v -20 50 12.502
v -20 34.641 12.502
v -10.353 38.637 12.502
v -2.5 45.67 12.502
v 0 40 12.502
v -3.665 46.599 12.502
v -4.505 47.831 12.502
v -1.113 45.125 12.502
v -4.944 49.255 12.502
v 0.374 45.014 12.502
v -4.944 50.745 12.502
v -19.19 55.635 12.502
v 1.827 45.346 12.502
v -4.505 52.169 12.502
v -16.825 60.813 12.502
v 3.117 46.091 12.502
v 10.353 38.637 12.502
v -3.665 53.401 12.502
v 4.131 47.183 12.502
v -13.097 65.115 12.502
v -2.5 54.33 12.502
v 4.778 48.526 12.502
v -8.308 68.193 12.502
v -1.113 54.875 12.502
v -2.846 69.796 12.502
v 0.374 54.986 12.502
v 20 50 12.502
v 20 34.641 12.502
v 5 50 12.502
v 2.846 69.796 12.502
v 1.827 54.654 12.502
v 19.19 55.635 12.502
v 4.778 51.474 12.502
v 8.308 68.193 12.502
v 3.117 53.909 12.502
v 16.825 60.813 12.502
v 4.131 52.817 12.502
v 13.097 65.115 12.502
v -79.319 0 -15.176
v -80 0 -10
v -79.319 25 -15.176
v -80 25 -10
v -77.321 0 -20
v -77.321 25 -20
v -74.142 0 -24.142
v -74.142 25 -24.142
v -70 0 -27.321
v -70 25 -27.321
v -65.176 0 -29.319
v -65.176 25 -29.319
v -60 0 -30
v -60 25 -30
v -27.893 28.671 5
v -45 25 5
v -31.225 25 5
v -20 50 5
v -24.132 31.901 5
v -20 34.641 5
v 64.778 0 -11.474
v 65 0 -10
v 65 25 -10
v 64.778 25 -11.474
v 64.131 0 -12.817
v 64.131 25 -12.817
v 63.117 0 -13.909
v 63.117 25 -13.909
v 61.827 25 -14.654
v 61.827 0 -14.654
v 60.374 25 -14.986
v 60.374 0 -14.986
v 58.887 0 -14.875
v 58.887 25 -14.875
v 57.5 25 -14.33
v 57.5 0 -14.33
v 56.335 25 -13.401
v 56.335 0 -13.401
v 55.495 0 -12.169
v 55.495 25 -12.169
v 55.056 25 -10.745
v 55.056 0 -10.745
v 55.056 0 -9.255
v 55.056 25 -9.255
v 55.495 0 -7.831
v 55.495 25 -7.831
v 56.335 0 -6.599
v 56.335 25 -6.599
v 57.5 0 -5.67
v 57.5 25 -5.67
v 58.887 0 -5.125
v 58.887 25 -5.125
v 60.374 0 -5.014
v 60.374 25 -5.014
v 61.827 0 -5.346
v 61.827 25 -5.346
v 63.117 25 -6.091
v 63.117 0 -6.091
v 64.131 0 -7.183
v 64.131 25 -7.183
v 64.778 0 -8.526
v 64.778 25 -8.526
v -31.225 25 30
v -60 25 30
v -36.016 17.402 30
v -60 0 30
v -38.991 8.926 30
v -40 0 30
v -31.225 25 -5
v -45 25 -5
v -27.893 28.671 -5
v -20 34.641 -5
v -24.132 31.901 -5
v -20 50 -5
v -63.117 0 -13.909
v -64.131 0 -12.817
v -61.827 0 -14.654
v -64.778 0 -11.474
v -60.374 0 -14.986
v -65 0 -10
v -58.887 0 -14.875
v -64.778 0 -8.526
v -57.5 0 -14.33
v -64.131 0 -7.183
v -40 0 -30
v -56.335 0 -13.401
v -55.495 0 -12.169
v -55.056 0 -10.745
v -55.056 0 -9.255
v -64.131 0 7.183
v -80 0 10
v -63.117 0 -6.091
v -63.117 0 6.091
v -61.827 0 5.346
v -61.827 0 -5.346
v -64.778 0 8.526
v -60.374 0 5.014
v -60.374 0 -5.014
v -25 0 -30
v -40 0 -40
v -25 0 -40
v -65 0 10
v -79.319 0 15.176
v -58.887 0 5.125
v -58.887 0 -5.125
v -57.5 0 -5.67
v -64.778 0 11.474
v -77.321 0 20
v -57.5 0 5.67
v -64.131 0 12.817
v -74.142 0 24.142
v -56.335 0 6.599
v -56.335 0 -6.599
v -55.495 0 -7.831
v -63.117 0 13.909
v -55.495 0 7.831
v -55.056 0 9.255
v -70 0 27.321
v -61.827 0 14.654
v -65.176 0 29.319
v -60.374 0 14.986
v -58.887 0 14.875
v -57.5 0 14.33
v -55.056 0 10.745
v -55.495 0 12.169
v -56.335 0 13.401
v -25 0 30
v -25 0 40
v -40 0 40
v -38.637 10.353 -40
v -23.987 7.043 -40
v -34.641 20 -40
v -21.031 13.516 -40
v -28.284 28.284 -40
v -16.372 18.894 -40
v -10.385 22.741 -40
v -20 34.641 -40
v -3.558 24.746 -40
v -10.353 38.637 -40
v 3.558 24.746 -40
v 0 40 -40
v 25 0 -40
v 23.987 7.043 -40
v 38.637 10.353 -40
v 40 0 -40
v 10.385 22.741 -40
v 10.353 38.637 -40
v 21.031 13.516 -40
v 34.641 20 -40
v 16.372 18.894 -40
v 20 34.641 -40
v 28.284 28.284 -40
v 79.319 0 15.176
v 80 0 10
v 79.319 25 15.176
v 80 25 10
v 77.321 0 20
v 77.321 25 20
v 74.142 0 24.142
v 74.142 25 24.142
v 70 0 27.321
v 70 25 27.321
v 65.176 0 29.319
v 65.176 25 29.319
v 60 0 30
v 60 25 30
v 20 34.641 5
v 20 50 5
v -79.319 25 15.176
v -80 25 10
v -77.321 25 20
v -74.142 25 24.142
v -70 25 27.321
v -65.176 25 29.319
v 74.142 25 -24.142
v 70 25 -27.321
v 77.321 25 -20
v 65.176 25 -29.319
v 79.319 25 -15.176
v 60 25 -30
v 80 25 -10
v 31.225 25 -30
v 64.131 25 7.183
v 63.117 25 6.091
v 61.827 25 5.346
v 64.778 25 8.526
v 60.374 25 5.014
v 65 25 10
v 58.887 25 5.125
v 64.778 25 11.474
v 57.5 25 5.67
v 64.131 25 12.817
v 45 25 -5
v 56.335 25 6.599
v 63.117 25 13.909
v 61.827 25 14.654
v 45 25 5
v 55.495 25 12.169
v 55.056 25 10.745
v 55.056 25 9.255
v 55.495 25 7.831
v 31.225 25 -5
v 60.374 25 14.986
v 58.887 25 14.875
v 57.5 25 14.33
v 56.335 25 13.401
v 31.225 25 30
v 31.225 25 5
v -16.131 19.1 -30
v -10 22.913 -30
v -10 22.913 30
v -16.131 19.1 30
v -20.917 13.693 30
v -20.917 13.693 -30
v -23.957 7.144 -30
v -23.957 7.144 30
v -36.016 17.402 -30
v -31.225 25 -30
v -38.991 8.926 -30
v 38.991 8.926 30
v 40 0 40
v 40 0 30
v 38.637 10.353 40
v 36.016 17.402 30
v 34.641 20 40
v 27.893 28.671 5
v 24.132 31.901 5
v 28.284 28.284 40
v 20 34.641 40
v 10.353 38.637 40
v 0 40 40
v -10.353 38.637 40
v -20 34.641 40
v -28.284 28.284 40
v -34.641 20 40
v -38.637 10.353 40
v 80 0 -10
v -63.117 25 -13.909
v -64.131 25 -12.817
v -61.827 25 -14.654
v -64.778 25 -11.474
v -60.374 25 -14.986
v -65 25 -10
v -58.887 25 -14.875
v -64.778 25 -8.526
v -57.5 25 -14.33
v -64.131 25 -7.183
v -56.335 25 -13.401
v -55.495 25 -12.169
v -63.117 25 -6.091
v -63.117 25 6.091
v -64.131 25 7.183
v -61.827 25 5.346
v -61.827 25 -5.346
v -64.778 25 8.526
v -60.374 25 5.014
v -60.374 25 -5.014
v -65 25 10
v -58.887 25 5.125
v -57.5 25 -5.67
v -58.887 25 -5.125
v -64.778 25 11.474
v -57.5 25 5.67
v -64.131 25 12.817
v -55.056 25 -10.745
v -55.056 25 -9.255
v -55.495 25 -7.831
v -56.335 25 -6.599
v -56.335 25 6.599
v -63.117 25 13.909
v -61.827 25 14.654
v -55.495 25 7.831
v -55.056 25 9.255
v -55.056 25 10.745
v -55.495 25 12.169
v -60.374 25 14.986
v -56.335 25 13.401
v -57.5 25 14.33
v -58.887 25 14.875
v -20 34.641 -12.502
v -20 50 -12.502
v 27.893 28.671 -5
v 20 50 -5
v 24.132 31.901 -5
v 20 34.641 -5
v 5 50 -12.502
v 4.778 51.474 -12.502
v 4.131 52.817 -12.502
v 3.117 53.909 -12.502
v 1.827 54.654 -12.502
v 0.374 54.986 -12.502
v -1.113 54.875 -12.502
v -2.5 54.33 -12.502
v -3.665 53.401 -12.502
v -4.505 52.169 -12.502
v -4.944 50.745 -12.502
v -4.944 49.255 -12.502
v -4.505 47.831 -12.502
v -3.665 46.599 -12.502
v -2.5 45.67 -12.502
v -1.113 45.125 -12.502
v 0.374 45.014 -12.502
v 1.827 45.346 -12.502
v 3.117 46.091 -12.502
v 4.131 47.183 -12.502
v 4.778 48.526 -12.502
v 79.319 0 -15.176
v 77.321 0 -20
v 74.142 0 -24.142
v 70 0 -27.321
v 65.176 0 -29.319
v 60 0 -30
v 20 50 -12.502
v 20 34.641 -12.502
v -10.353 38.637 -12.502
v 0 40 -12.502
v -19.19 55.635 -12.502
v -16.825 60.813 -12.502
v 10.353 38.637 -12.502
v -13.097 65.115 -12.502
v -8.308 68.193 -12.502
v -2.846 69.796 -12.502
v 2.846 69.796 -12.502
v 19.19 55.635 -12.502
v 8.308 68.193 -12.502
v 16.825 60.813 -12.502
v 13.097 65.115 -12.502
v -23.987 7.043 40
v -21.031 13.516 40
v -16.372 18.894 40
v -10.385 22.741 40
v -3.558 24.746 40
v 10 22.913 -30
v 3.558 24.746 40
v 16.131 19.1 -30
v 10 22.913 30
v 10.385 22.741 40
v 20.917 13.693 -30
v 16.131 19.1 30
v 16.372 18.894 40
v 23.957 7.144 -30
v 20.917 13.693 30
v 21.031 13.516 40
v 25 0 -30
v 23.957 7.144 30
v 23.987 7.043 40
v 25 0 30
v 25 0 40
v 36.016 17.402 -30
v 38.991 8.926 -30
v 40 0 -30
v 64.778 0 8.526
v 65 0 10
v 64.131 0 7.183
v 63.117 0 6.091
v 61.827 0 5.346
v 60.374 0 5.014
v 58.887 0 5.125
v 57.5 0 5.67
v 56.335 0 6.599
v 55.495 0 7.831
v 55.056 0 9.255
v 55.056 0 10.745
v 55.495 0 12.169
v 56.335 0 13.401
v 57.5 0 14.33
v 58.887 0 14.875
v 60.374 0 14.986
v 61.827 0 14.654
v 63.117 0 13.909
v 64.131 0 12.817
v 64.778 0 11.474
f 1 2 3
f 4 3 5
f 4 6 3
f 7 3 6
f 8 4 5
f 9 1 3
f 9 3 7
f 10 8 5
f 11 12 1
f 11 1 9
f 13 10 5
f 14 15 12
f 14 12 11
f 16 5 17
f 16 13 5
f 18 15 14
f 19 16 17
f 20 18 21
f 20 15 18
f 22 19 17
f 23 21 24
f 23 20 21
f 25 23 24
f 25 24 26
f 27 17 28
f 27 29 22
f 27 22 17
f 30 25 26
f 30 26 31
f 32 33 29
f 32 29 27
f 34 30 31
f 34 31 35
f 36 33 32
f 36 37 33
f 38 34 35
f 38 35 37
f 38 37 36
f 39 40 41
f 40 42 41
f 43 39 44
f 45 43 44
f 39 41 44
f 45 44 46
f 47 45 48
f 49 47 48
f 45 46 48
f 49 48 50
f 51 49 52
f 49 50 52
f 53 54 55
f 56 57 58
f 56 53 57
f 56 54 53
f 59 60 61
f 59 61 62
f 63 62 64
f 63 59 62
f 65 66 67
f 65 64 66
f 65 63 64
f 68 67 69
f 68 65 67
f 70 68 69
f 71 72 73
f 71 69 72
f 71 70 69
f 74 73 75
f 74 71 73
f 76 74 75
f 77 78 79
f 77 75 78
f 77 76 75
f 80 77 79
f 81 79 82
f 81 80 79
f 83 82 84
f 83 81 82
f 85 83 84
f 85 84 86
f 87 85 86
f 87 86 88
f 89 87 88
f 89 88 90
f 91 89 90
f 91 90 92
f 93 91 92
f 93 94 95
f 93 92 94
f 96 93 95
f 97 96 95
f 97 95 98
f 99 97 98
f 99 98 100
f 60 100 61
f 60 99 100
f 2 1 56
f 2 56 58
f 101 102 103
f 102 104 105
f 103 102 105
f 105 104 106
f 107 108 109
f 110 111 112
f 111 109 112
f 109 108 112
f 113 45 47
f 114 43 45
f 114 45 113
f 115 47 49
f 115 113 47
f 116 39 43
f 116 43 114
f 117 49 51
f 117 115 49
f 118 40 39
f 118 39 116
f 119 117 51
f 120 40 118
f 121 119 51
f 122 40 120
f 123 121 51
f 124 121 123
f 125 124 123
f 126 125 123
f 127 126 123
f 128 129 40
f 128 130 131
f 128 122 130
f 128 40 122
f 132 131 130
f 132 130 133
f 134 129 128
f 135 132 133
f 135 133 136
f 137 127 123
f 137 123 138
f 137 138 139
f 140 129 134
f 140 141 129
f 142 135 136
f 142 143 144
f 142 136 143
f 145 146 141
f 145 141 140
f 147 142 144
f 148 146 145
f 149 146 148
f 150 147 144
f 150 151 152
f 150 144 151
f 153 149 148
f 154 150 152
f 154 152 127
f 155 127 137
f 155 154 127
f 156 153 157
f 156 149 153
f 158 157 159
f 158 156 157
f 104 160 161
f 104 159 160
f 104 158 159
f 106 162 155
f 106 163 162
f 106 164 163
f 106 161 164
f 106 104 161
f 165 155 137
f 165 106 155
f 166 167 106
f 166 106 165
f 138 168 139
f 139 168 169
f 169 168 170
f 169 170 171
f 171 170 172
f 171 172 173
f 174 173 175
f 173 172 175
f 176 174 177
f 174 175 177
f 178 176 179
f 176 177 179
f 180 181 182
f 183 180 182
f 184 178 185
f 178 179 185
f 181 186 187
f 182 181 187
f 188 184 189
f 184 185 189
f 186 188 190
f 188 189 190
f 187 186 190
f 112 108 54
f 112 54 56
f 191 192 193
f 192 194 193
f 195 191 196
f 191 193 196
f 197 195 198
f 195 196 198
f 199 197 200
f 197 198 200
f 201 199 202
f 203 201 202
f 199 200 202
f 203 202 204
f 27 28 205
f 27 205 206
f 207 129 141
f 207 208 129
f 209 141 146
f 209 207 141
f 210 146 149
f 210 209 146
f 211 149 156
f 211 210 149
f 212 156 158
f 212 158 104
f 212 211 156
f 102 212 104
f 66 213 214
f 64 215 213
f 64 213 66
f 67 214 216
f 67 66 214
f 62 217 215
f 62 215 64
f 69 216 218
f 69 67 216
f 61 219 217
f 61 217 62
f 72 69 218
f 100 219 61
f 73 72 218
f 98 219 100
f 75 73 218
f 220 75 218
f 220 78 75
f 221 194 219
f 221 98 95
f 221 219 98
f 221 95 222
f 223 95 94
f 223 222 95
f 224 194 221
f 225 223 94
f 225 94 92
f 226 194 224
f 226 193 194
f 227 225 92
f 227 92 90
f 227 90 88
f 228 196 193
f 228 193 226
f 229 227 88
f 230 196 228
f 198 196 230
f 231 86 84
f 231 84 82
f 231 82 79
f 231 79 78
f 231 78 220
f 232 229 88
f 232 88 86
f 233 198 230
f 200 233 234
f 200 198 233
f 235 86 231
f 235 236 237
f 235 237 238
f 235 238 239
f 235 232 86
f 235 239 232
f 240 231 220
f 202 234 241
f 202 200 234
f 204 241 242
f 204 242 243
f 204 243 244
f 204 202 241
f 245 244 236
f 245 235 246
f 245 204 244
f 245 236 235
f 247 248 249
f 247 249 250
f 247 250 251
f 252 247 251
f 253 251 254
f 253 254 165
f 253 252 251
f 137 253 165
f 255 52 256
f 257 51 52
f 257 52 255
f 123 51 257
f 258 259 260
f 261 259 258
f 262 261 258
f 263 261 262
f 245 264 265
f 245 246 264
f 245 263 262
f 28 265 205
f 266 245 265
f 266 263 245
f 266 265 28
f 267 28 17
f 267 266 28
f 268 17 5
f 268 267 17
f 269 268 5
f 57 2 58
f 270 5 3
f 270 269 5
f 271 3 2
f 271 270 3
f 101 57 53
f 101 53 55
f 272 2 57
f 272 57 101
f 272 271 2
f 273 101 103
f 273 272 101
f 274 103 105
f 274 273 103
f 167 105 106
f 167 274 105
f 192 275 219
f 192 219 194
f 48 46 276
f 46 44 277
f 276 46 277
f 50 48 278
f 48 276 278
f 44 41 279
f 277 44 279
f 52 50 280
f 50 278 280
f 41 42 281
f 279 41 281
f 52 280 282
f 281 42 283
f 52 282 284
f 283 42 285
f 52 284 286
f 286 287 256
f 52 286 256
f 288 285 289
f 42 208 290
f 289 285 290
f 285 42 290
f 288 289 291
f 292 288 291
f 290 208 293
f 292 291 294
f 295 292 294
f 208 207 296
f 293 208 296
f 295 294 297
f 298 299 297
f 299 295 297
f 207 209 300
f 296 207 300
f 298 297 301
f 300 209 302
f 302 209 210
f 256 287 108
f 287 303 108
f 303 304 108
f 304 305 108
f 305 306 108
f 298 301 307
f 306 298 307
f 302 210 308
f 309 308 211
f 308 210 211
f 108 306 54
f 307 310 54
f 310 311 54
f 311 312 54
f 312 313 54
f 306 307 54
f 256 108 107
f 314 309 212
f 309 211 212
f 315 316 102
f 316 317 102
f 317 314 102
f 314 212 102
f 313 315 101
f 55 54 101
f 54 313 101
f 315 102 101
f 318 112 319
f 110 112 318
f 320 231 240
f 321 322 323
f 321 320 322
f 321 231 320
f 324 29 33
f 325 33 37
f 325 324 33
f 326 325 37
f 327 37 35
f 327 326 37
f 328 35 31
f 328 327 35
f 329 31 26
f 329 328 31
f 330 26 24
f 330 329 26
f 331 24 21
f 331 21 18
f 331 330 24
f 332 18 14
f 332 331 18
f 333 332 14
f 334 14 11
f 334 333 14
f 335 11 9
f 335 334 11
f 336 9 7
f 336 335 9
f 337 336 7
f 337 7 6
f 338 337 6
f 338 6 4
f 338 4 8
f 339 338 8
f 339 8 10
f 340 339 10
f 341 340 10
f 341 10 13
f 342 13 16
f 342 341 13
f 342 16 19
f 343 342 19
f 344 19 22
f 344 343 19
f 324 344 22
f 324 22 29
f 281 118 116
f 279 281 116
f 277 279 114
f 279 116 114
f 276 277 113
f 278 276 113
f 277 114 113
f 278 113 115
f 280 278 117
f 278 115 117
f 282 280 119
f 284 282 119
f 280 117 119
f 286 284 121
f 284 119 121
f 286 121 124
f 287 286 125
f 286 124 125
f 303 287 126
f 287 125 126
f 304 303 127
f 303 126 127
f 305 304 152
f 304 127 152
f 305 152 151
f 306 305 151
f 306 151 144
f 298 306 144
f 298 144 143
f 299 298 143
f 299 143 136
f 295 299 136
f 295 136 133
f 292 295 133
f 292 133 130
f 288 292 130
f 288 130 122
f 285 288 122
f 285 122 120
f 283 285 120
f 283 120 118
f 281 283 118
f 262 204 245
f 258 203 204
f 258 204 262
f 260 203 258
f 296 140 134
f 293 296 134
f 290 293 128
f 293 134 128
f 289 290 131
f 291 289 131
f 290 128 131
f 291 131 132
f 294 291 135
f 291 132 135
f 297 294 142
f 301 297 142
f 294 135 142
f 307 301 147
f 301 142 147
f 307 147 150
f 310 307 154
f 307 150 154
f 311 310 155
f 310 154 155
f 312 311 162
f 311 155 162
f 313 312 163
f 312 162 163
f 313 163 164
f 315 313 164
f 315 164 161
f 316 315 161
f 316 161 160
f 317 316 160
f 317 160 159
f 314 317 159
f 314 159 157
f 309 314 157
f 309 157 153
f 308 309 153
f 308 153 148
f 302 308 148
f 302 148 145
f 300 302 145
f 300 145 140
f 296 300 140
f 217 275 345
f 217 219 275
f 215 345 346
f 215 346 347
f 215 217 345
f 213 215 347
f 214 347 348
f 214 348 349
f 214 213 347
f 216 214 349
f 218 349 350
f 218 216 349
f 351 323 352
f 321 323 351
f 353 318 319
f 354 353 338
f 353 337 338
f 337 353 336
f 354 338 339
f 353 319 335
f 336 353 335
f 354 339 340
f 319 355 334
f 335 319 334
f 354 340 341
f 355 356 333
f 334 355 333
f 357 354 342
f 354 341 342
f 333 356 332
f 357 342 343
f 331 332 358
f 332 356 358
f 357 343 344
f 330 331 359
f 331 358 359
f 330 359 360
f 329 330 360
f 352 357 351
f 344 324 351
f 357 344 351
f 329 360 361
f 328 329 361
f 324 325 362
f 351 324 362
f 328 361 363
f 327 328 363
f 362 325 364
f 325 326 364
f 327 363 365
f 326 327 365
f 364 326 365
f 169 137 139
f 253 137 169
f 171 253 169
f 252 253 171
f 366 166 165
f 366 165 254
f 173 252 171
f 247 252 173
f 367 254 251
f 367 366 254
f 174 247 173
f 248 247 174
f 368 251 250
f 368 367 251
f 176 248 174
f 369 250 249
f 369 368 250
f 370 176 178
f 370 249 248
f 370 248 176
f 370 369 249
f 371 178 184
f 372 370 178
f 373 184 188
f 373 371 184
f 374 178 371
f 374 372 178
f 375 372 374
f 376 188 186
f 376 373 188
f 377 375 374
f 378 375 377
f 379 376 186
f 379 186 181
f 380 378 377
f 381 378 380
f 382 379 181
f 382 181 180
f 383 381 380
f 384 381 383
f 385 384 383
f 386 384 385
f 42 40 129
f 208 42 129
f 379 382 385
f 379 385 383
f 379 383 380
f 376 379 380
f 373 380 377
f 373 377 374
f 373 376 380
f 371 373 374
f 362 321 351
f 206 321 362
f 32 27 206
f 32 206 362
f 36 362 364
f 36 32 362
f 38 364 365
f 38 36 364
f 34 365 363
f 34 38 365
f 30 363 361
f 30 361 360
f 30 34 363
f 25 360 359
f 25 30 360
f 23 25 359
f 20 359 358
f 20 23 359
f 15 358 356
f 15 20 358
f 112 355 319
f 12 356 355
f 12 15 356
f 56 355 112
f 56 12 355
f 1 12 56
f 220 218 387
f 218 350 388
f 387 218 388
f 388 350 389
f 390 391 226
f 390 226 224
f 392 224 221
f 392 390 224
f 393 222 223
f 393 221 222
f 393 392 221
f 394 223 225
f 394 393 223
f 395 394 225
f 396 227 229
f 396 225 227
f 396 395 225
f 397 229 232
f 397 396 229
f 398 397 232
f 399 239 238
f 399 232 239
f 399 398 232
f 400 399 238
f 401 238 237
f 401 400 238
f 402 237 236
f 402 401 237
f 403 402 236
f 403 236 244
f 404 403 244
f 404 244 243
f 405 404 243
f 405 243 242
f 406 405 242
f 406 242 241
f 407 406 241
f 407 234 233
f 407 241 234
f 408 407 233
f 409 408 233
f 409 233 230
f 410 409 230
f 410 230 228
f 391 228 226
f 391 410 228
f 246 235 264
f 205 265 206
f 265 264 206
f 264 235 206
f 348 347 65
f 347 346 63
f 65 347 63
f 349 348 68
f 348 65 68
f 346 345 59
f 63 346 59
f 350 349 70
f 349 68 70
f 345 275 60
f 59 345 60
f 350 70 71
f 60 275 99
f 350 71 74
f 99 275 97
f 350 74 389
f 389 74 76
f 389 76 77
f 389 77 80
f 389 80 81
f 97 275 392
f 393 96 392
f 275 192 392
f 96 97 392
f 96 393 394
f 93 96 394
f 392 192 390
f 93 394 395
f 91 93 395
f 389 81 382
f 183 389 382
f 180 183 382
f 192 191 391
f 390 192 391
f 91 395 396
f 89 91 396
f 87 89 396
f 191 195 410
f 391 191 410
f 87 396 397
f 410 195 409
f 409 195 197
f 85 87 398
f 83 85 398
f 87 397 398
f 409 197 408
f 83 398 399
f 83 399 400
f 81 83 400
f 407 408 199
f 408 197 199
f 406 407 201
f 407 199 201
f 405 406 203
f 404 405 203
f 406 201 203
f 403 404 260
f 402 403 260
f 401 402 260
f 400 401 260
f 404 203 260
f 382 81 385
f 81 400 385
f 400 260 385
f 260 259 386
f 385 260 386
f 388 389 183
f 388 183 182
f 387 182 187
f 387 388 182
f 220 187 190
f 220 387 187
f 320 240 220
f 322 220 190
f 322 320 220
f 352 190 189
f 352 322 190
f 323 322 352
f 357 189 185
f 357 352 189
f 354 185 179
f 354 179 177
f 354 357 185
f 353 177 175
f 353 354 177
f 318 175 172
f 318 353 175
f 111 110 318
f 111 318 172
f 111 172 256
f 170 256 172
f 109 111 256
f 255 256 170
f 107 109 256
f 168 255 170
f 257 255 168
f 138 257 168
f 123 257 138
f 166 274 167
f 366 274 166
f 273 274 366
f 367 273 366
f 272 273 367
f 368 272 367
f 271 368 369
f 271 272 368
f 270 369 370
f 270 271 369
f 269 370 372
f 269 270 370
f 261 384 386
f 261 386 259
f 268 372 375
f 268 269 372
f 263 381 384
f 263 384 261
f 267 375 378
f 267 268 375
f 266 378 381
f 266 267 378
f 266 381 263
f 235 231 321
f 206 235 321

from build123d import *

# Parameters (mm, degrees)
BOSS_EXTRUDE1_DEPTH        = 40
SKETCH2_W                  = 70
SKETCH2_H                  = 60
BOSS_EXTRUDE2_DEPTH        = 25
FILLET1_R                  = 20
F_10_0_10_DIAMETER_HOLE1_D = 10
FILLET1_OF_MIRROR1_R       = 20
DELETEFACE1_START          = -30
DELETEFACE1_DEPTH          = 60
SKETCH5_R                  = 5
BOSS_EXTRUDE3_DEPTH        = 12.5015
RIB1_REACH                 = 115.578
SKETCH6_WALL_W             = 264.511672892
SKETCH6_WALL_H             = 10


# Read off the part's stored shape, not the designer's step: DeleteFace1
with BuildPart() as part:
    # Sketch1 → Boss-Extrude1 (new, symmetric)
    with BuildSketch(Plane.XY):
        with BuildLine():
            Line((-40, 0), (-25, 0))
            ThreePointArc((-25, 0), (0, 25), (25, 0))
            Line((25, 0), (40, 0))
            ThreePointArc((40, 0), (0, 40), (-40, 0))
        make_face()
    extrude(amount=BOSS_EXTRUDE1_DEPTH, both=True)

    # Sketch2 → Boss-Extrude2 (add)
    with BuildSketch(Plane.XZ):
        with Locations((-45, 0)):
            Rectangle(SKETCH2_W, SKETCH2_H)
    boss_extrude2 = extrude(amount=-BOSS_EXTRUDE2_DEPTH)

    # Fillet1
    fillet1_edges = [part.edges().sort_by_distance(p)[0] for p in [
        (-80, 12.5, 30),
        (-80, 12.5, -30),
    ]]
    fillet(fillet1_edges, radius=FILLET1_R)

    # Ø10.0 (10) Diameter Hole1 (through all)
    with Locations(Plane(origin=(0, 25, 0), x_dir=(1, 0, 0), z_dir=(0, 1, 0))):
        with Locations((-60, -10), (-60, 10)):
            f_10_0_10_diameter_hole1 = Hole(F_10_0_10_DIAMETER_HOLE1_D / 2)

    # Mirror1: Boss-Extrude2, Ø10.0 (10) Diameter Hole1 across plane
    add(boss_extrude2.mirror(Plane(origin=(0, 0, 0), x_dir=(0, 0, 1), z_dir=(1, 0, 0))))
    add(f_10_0_10_diameter_hole1.mirror(Plane(origin=(0, 0, 0), x_dir=(0, 0, 1), z_dir=(1, 0, 0))), mode=Mode.SUBTRACT)

    # Fillet1 of Mirror1
    fillet1_of_mirror1_edges = [part.edges().sort_by_distance(p)[0] for p in [
        (80, 12.5, 30),
        (80, 12.5, -30),
    ]]
    fillet(fillet1_of_mirror1_edges, radius=FILLET1_OF_MIRROR1_R)

    # DeleteFace1 outline → DeleteFace1 (cut)
    with BuildSketch(Plane.XY.offset(DELETEFACE1_START)):
        with BuildLine():
            ThreePointArc((25, 0), (20.916500663, 13.693063938), (10, 22.912878475))
            Line((10, 22.912878475), (10, 0))
            Line((10, 0), (25, 0))
        make_face()
        with BuildLine():
            ThreePointArc((-10, 22.912878475), (-20.916500663, 13.693063938), (-25, 0))
            Line((-25, 0), (-10, 0))
            Line((-10, 0), (-10, 22.912878475))
        make_face()
    extrude(amount=DELETEFACE1_DEPTH, mode=Mode.SUBTRACT)

    # Sketch5 → Boss-Extrude3 (add, symmetric)
    with BuildSketch(Plane.XY):
        with BuildLine():
            Line((-20, 50), (-20, 34.641016151))
            ThreePointArc((-20, 34.641016151), (0, 40), (20, 34.641016151))
            Line((20, 34.641016151), (20, 50))
            ThreePointArc((20, 50), (0, 70), (-20, 50))
        make_face()
        with Locations((0, 50)):
            Circle(SKETCH5_R, mode=Mode.SUBTRACT)
    extrude(amount=BOSS_EXTRUDE3_DEPTH, both=True)

    # Sketch6 wall → Rib1 (add, up to next)
    with BuildSketch(Plane(origin=(-32.5, 37.5, 0), x_dir=(0.707106781187, 0.707106781187, 0), z_dir=(-0.707106781187, 0.707106781187, 0)), mode=Mode.PRIVATE) as rib1_sk1:
        Rectangle(SKETCH6_WALL_W, SKETCH6_WALL_H)
    rib1_tool1 = extrude(rib1_sk1.sketch, amount=-RIB1_REACH, mode=Mode.PRIVATE) - part.part
    rib1 = rib1_tool1.solids().sort_by_distance((-32.5, 37.5, 0))[0]
    add(rib1)

    # Mirror2: Rib1 across plane
    add(rib1.mirror(Plane(origin=(0, 0, 0), x_dir=(0, 0, 1), z_dir=(1, 0, 0))))


solid = part.part
